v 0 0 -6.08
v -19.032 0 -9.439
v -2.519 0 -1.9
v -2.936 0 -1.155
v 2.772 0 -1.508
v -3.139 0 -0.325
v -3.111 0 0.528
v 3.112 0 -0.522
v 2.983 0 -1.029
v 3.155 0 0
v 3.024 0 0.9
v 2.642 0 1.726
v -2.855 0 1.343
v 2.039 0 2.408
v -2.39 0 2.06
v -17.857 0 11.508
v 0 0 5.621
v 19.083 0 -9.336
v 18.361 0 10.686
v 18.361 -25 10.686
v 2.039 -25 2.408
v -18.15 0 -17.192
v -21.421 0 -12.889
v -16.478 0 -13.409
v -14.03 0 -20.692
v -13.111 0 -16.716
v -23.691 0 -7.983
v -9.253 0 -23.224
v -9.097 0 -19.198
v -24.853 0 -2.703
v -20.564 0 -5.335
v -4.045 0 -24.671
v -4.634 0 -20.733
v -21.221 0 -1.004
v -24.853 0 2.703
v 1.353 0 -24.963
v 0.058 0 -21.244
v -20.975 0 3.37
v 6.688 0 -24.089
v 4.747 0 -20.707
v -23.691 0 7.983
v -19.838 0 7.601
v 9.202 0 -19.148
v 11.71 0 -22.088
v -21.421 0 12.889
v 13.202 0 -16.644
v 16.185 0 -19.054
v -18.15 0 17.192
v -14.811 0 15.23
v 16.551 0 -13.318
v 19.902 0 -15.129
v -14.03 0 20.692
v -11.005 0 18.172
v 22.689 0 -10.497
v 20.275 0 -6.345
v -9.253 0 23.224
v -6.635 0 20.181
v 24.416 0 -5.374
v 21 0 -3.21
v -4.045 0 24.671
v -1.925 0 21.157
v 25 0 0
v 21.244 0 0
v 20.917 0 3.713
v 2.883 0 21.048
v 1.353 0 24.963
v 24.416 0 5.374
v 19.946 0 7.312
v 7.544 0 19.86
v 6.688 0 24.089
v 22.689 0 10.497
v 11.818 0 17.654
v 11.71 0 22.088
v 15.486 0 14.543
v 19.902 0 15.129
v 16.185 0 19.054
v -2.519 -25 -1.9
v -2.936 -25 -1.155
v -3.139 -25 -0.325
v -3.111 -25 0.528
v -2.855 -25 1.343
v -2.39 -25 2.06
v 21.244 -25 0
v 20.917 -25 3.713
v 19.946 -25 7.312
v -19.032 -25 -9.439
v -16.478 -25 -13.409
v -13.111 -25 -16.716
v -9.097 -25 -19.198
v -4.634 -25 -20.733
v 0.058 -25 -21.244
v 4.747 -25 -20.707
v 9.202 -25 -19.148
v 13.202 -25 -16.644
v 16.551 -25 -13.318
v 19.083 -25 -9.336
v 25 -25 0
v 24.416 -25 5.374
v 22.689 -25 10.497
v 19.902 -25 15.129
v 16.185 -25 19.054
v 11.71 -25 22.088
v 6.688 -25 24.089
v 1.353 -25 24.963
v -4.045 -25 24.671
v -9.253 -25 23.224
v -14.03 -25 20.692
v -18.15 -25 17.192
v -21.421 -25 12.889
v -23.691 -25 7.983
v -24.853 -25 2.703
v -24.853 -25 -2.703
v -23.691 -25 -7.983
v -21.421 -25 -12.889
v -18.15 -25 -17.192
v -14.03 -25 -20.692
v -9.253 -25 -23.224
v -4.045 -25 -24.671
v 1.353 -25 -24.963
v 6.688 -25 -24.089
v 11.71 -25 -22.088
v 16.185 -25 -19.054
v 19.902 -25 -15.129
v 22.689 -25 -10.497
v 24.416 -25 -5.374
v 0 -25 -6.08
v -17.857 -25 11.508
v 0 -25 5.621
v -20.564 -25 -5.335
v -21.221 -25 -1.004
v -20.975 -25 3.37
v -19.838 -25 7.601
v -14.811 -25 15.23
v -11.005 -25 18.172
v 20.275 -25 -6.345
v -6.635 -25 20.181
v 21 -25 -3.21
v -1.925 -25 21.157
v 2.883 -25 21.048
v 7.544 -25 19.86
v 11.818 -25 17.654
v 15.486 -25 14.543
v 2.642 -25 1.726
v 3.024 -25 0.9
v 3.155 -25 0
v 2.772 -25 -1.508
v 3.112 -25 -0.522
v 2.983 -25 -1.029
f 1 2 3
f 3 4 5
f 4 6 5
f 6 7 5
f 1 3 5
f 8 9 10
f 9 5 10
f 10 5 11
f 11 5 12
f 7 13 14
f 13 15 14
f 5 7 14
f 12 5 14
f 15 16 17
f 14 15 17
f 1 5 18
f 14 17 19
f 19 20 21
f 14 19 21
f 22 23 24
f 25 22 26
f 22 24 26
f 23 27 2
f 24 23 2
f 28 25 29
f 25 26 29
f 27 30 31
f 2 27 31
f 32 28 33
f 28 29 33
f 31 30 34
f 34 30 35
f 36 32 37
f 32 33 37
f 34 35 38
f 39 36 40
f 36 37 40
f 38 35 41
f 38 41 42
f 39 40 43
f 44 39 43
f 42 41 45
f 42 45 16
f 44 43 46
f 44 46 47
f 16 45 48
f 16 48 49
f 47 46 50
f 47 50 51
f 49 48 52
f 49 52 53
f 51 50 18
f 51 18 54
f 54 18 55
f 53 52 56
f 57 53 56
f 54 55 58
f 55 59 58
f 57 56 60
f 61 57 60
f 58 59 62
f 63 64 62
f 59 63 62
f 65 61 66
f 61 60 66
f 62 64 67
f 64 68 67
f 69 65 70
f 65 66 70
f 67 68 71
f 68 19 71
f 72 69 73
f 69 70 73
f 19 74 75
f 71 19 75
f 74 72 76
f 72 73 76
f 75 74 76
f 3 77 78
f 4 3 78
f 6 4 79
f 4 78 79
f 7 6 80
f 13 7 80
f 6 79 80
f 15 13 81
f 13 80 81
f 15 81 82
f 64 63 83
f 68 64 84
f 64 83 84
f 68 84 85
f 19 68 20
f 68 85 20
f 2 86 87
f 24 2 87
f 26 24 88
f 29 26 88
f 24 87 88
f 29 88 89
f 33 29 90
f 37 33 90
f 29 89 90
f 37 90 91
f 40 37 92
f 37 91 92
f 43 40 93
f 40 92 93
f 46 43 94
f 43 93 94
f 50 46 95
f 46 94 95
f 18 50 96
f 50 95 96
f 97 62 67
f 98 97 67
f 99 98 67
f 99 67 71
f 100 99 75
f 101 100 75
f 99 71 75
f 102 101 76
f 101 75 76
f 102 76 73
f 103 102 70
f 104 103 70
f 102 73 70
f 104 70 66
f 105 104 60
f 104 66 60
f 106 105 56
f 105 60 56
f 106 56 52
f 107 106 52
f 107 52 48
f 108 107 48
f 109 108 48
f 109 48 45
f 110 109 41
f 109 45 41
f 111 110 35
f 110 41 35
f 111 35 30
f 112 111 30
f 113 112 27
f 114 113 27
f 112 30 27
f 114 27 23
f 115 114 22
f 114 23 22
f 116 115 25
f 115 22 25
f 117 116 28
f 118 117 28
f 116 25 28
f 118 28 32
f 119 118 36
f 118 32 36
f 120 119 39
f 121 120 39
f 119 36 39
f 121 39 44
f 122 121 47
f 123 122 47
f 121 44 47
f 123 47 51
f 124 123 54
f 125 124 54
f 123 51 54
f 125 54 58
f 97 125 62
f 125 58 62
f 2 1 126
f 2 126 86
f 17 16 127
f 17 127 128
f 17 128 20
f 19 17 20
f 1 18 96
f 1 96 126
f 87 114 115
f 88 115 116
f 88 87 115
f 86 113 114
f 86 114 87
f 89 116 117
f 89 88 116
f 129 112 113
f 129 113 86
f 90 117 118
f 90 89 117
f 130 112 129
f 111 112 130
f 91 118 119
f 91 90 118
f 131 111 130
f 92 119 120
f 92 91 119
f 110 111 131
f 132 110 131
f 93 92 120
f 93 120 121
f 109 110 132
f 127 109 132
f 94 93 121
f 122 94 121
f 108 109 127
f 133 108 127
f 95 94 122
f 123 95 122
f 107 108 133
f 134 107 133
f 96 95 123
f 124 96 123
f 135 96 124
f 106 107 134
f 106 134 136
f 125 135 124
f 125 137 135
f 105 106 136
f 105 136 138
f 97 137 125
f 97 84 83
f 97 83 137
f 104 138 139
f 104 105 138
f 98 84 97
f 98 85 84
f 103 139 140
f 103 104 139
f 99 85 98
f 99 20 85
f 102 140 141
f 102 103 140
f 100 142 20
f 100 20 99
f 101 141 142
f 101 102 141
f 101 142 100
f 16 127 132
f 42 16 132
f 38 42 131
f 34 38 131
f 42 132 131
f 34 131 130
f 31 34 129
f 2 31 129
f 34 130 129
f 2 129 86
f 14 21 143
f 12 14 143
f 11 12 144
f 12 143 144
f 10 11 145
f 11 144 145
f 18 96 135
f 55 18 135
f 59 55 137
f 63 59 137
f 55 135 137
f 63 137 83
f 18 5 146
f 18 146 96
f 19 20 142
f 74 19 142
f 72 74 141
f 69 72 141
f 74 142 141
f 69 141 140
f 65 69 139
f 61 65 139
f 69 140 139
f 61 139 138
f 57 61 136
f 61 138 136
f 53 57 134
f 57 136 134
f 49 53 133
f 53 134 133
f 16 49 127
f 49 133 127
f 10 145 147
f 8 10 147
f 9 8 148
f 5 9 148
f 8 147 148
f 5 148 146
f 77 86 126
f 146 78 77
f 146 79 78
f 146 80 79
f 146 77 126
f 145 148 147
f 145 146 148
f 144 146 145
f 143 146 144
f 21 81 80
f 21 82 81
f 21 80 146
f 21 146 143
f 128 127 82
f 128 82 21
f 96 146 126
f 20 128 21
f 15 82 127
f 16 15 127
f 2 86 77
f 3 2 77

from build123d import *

# Parameters (mm, degrees)
F0_R     = 25
F1_DEPTH = 25
F3_DEPTH = 30
F4_DEPTH = 25


with BuildPart() as f1:
    # F0 (on Front) → F1 (new body)
    with BuildSketch(Plane.XZ):
        Circle(F0_R)
    extrude(amount=F1_DEPTH)

    # F2 (on face) → F3 (cut)
    with BuildSketch(Plane.XZ.offset(25)):
        with BuildLine():
            Line((0, 5.620659), (18.36088, 10.686402))
            ThreePointArc((18.36088, 10.686402), (0.481924, 21.238852), (-17.857269, 11.508216))
            Line((-17.857269, 11.508216), (0, 5.620659))
        make_face()
        with BuildLine():
            ThreePointArc((-19.032019, -9.439457), (0.057919, -21.24424), (19.083206, -9.335542))
            Line((19.083206, -9.335542), (0, -6.079973))
            Line((0, -6.079973), (-19.032019, -9.439457))
        make_face()
    extrude(amount=-F3_DEPTH, mode=Mode.SUBTRACT)

    # F2 (on face) → F4 (cut)
    with BuildSketch(Plane.XZ.offset(25)):
        with BuildLine():
            Line((-2.390367, 2.059839), (-17.857269, 11.508216))
            ThreePointArc((-17.857269, 11.508216), (-21.210991, 1.189517), (-19.032019, -9.439457))
            Line((-19.032019, -9.439457), (-2.51914, -1.900191))
            ThreePointArc((-2.51914, -1.900191), (-3.153771, 0.102555), (-2.390367, 2.059839))
        make_face()
        with BuildLine():
            ThreePointArc((19.083206, -9.335542), (20.69699, -4.79121), (21.244319, 0))
            ThreePointArc((21.244319, 0), (20.510796, 5.534289), (18.36088, 10.686402))
            Line((18.36088, 10.686402), (2.039434, 2.407799))
            ThreePointArc((2.039434, 2.407799), (2.862874, 1.326929), (3.155438, 0))
            ThreePointArc((3.155438, 0), (3.058071, -0.777813), (2.771977, -1.507624))
            Line((2.771977, -1.507624), (19.083206, -9.335542))
        make_face()
    extrude(amount=-F4_DEPTH, mode=Mode.SUBTRACT)


solid = f1.part
